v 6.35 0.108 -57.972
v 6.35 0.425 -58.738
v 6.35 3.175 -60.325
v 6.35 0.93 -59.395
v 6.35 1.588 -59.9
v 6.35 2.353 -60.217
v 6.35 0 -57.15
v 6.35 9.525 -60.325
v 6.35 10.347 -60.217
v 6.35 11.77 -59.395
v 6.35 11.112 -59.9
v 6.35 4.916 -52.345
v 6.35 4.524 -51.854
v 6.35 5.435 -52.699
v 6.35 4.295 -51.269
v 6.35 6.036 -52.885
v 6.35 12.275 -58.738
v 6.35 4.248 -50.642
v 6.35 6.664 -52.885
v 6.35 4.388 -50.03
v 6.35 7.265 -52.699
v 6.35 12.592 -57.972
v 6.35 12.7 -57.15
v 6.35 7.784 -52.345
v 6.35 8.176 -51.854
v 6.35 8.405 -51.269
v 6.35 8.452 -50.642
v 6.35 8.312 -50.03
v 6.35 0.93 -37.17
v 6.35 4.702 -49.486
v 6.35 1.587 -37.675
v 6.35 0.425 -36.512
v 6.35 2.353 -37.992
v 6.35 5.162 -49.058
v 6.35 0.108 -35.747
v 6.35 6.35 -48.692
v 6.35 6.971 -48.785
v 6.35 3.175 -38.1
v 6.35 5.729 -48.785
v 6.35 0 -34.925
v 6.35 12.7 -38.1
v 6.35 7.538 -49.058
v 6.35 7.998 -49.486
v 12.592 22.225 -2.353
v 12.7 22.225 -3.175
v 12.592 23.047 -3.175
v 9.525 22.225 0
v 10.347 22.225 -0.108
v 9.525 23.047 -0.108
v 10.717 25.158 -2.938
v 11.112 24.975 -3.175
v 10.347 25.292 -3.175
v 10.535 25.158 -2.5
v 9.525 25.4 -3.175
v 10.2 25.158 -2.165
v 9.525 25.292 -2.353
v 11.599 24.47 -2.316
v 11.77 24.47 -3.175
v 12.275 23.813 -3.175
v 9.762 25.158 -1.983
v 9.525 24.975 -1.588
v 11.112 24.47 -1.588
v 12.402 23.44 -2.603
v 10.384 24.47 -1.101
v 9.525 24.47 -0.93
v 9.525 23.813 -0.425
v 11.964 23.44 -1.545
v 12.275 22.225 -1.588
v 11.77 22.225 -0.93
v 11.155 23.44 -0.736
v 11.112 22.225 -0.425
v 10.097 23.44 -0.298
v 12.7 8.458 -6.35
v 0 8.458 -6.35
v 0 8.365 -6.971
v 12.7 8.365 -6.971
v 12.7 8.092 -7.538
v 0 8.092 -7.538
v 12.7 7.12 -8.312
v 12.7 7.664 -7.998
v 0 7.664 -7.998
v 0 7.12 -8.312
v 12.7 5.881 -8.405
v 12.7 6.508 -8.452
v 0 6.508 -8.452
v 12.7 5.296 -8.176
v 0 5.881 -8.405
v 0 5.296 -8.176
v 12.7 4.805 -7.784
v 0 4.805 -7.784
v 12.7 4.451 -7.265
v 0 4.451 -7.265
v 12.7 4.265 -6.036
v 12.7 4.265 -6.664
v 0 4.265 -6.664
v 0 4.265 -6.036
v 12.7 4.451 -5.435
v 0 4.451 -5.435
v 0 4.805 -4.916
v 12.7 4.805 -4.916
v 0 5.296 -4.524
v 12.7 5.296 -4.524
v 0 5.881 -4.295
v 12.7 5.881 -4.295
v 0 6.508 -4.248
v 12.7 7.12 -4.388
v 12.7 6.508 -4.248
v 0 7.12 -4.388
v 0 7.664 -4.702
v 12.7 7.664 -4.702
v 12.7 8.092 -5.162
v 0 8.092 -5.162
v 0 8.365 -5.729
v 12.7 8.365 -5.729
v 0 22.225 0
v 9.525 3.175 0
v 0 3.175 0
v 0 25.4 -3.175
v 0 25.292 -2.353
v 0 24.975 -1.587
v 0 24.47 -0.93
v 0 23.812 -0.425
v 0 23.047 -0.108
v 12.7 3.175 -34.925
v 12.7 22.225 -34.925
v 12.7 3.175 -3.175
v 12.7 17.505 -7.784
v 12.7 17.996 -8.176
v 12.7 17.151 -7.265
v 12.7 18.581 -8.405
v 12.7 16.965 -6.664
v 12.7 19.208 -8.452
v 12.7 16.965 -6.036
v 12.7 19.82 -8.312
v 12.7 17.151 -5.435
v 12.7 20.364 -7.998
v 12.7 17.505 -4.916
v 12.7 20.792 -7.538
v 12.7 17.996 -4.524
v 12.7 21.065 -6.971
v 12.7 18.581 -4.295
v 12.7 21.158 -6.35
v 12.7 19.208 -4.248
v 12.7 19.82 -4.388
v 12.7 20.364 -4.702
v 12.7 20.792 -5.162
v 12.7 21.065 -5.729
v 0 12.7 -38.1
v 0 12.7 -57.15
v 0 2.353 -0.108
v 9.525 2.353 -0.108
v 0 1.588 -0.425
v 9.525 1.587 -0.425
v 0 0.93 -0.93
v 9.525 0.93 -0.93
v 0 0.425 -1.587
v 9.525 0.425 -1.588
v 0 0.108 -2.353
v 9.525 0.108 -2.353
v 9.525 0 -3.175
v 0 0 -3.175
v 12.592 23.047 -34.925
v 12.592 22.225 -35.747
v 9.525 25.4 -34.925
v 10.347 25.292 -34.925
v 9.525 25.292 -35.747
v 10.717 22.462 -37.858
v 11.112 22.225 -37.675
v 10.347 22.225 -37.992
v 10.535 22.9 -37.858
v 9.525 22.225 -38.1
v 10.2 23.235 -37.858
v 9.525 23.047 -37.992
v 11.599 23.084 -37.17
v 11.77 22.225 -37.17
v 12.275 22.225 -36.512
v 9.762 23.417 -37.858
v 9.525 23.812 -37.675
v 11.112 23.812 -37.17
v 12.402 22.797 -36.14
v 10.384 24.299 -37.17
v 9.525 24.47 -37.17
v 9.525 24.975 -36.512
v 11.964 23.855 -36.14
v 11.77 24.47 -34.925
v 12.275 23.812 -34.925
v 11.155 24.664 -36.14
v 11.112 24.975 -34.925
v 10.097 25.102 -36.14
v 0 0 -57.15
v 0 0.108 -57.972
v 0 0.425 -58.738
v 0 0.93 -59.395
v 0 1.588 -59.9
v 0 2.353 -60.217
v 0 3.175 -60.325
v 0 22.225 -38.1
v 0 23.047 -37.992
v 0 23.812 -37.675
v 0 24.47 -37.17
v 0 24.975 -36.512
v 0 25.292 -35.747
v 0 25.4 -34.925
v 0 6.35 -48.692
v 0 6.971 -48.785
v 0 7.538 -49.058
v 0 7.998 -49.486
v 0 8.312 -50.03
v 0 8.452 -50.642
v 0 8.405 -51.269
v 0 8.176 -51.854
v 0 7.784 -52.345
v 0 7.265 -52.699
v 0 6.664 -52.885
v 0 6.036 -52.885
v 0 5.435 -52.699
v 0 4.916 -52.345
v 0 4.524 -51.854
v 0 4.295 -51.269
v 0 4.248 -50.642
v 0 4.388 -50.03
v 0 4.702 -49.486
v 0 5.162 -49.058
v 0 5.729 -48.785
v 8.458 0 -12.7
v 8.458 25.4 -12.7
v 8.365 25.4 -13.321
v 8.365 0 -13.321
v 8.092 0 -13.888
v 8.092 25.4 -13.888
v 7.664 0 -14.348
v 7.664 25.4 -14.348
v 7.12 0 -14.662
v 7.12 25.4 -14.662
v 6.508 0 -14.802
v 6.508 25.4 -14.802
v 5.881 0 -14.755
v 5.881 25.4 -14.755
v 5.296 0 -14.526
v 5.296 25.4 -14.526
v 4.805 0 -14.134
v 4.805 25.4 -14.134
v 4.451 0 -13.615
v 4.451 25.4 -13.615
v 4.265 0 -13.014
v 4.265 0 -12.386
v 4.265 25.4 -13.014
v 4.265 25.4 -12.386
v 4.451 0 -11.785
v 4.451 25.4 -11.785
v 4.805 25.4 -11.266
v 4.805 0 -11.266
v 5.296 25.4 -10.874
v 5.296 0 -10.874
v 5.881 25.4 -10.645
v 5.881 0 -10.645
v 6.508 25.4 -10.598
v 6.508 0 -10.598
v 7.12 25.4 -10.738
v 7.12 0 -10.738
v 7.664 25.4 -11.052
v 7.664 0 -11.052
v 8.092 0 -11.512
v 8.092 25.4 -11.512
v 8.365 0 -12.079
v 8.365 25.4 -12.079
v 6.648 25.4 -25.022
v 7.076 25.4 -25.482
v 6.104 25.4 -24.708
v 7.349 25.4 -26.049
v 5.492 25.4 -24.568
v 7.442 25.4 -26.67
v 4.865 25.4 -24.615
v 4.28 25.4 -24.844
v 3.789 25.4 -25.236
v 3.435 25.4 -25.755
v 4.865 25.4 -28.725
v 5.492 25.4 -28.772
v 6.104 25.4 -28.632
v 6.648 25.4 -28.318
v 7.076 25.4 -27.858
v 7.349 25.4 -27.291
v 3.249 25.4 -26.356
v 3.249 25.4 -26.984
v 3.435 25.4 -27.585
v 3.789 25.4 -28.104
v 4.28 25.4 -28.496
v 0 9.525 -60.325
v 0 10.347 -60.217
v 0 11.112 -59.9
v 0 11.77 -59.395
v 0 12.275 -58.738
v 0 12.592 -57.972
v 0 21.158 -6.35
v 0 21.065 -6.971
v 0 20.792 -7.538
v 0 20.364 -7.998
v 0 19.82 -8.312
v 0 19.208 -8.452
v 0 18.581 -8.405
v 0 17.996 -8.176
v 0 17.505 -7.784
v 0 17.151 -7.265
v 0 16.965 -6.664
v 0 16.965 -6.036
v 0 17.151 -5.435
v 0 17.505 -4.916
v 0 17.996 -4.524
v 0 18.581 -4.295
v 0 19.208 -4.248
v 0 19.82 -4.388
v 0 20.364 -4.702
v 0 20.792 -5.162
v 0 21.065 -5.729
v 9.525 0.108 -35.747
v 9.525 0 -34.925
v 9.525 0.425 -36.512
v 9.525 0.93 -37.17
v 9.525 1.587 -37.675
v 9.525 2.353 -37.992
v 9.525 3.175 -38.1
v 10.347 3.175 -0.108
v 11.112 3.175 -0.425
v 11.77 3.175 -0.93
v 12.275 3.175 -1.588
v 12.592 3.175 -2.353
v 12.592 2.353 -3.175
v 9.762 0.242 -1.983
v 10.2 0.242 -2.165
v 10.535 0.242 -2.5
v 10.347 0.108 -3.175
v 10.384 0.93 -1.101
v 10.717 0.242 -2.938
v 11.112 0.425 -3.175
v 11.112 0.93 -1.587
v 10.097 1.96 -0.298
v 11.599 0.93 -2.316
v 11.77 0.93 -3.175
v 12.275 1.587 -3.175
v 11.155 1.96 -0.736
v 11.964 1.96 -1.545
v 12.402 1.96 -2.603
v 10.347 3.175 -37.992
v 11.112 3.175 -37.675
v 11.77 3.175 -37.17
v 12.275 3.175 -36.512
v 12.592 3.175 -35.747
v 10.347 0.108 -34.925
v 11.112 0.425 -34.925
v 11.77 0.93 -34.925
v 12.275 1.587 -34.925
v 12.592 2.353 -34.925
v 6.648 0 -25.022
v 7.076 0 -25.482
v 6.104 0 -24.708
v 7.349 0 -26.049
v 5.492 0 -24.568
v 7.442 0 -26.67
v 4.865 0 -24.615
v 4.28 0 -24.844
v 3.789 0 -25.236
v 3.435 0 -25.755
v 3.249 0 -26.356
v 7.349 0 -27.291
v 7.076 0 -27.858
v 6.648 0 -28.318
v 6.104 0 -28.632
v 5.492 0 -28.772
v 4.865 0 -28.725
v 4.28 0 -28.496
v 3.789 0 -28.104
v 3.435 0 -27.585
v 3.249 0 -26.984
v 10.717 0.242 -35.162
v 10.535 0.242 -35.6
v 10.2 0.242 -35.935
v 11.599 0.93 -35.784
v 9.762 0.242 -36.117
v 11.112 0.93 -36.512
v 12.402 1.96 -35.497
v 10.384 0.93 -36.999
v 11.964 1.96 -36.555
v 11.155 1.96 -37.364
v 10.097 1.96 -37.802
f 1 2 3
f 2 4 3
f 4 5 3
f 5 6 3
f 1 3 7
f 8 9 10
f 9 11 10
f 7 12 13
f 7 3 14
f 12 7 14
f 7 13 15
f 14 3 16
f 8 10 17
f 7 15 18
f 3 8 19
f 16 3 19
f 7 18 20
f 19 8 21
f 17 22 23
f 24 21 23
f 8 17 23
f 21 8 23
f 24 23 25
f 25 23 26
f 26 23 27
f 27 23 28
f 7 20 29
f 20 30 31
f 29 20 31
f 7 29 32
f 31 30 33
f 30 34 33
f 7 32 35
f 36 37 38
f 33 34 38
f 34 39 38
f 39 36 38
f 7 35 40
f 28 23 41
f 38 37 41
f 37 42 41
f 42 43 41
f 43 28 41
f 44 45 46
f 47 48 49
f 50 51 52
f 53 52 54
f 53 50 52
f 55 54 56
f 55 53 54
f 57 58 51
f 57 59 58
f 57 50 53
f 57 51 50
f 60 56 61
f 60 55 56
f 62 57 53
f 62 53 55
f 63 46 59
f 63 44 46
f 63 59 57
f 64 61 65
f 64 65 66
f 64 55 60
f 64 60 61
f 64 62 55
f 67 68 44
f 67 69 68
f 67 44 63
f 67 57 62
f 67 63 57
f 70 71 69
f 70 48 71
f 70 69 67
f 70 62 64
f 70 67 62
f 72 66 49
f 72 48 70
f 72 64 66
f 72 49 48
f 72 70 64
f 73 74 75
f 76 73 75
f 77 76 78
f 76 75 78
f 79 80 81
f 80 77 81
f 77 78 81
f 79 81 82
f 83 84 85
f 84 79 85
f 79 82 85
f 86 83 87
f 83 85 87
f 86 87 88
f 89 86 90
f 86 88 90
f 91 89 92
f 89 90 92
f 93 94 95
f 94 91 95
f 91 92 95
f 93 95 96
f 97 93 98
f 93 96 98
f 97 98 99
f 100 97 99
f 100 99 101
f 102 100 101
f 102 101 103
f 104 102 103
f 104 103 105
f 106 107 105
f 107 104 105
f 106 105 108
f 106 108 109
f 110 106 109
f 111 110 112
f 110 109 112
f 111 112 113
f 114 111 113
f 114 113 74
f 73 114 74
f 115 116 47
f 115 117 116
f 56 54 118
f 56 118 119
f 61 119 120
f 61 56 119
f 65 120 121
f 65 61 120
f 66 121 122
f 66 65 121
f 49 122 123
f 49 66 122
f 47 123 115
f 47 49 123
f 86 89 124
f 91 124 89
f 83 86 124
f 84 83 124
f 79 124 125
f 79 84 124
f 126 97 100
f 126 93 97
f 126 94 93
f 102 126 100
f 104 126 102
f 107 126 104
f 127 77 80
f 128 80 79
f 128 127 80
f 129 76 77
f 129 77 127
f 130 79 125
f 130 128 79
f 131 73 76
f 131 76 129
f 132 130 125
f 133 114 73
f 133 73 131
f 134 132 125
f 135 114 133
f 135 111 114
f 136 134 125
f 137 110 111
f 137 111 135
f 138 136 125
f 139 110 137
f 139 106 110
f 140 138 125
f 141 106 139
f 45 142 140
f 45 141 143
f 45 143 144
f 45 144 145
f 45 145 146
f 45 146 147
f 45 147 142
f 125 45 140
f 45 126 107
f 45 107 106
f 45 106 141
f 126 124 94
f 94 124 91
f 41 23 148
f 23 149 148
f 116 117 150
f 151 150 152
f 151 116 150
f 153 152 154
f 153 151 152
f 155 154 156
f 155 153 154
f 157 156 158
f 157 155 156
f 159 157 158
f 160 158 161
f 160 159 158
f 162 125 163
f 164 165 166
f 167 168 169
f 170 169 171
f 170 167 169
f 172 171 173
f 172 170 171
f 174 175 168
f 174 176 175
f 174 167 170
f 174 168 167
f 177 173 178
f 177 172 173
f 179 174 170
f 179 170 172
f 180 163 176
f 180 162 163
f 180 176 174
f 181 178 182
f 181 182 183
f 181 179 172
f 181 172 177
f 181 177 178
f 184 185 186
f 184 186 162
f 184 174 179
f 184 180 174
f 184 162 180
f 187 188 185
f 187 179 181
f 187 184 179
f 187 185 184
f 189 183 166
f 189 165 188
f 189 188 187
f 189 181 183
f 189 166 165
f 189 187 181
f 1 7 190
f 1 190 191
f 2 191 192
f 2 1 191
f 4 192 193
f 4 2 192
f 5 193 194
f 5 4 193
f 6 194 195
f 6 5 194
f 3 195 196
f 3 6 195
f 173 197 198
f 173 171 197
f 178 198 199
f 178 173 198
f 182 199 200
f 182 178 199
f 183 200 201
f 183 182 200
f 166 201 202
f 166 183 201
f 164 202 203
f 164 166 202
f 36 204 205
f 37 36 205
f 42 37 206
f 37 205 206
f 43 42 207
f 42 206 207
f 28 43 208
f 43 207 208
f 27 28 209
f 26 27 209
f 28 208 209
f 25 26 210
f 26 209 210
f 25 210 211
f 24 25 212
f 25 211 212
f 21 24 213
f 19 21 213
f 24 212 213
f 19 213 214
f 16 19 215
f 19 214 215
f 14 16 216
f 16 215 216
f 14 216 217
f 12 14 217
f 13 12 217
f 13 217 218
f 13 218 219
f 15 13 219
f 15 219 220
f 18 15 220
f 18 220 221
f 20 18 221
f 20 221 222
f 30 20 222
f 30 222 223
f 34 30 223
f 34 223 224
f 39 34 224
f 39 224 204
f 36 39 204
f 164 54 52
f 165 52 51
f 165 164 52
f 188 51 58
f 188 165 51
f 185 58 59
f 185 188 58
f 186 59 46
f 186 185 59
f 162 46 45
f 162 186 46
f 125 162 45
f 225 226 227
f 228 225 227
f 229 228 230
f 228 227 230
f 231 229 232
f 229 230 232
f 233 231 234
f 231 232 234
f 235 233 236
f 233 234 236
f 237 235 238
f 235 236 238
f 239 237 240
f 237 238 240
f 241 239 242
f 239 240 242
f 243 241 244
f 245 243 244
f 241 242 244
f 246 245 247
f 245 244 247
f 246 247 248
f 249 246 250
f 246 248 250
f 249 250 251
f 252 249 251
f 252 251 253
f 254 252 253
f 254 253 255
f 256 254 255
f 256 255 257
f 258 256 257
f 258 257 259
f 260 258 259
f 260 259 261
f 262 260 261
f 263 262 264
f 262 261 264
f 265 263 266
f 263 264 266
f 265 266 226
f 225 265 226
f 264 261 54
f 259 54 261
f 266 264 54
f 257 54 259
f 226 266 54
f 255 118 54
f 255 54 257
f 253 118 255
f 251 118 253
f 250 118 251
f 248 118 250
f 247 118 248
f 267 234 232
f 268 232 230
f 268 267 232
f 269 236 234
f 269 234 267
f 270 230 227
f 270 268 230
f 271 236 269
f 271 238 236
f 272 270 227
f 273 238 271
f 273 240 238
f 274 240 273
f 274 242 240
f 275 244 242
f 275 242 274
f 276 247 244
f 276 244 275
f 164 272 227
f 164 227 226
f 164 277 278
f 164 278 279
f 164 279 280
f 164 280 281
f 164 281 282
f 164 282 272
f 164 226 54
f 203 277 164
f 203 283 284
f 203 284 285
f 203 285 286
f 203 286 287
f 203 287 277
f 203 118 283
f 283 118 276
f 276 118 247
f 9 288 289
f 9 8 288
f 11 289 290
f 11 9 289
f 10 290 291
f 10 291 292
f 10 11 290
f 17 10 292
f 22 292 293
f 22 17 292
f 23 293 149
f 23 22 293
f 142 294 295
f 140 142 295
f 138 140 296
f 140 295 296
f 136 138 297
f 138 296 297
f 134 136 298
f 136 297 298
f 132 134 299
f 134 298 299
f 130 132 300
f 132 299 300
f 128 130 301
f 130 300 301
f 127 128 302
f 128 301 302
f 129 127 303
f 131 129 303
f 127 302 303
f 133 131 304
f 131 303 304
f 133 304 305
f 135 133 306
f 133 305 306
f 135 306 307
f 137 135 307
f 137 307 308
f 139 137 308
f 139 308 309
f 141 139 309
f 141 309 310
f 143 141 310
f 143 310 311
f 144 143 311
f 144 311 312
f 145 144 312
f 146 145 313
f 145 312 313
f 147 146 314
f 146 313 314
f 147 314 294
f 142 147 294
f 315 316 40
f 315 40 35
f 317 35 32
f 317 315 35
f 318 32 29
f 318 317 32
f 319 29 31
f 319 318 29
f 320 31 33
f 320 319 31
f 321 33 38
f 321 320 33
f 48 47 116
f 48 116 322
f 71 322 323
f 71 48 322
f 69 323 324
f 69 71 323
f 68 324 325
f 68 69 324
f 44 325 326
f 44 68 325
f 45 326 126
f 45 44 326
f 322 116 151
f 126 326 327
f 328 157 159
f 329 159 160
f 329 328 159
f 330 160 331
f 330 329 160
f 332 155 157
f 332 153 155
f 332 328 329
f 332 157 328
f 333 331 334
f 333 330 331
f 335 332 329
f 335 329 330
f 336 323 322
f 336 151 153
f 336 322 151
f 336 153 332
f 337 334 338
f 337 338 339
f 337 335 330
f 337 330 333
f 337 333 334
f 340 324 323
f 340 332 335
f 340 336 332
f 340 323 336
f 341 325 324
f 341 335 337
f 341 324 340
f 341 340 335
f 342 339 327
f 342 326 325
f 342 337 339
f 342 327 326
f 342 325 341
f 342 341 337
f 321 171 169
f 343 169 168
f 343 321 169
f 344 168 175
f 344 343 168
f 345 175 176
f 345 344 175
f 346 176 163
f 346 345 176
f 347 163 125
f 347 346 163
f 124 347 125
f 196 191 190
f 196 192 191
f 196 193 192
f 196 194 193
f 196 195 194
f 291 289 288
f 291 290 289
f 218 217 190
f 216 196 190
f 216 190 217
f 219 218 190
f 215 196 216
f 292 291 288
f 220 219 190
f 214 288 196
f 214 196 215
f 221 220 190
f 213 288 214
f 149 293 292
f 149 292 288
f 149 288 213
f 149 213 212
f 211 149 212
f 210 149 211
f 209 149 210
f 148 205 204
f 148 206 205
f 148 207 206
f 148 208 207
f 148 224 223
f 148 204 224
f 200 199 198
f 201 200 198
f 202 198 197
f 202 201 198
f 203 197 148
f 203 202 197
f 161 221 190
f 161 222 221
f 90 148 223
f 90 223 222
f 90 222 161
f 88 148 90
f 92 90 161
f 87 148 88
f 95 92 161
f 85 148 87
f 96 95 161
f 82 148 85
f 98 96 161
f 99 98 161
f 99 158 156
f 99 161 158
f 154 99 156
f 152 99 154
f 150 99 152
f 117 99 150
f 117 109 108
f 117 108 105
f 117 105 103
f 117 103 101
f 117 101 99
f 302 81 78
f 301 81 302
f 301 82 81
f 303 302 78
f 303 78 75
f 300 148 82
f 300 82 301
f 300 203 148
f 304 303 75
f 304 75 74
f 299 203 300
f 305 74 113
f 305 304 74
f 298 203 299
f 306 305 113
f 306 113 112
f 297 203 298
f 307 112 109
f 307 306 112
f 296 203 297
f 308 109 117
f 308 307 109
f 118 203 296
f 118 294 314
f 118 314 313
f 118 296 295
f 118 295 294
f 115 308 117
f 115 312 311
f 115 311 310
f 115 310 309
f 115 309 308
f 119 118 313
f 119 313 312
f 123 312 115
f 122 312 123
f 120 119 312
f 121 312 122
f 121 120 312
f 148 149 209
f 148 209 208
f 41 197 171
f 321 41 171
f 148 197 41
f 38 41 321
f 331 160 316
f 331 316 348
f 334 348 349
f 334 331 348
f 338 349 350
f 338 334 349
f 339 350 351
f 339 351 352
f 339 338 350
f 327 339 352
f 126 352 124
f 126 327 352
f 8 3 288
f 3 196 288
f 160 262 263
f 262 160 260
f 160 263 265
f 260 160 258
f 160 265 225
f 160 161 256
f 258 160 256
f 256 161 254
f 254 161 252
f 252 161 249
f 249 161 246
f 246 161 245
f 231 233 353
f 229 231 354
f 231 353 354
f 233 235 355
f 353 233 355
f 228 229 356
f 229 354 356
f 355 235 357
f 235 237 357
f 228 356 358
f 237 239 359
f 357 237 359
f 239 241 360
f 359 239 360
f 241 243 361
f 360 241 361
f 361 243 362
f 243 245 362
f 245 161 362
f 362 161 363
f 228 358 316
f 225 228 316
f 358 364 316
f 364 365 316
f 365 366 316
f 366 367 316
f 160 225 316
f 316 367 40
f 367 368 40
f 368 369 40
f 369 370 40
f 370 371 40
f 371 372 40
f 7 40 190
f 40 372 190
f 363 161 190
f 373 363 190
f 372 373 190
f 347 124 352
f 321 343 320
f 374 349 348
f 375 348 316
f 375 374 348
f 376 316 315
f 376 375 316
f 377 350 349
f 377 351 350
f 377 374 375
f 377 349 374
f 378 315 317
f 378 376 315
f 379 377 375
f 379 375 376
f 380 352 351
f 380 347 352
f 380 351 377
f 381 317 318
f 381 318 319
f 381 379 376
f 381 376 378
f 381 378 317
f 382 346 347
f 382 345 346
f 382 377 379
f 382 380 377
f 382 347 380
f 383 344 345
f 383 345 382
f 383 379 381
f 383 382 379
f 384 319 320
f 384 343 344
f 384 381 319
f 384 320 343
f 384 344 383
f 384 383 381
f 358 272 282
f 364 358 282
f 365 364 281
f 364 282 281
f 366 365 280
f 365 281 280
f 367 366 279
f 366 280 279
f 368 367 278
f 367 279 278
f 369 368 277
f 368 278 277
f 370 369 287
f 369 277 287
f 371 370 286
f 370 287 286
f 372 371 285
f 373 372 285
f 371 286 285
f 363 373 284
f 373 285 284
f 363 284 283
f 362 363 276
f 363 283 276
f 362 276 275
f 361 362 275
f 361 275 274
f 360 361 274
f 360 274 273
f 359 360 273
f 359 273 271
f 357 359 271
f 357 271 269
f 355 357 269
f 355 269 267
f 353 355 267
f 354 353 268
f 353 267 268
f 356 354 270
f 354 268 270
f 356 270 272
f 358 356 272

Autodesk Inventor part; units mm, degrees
ref_plane "YZ Plane" through (0, 0, 0) normal (1, 0, 0) x (0, 1, 0)
ref_plane "XZ Plane" through (0, 0, 0) normal (0, 1, 0) x (-1, 0, 0)
ref_plane "XY Plane" through (0, 0, 0) normal (0, 0, 1) x (1, 0, 0)
sketch "Sketch1" plane through (0, 0, 0) normal (1, 0, 0) x (0, 1, 0)
  line L0 (0, 0) -> (25.4, 0)
  line L1 (25.4, 0) -> (25.4, -38.1)
  line L2 (25.4, -38.1) -> (0, -38.1)
  line L3 (0, -38.1) -> (0, 0)
  line L4 (25.4, 0) -> (25.4, -6.35)
  line L5 (25.4, -6.35) -> (19.05, -6.35)
  line L6 (19.05, -6.35) -> (6.35, -6.35)
  circle A0 centre (19.05, -6.35) radius 2.1082
  circle A1 centre (6.35, -6.35) radius 2.1082
  dimension "d0" = 38.1
  dimension "d1" = 25.4
  dimension "d2" = 6.35
  dimension "d3" = 6.35
  dimension "d4" = 12.7
  dimension "d5" = 4.2164
extrude "Extrusion1" add sketch "Sketch1" along normal blind 12.7
sketch "Sketch2" plane through (0, 25.4, 0) normal (0, 1, 0) x (1, 0, 0)
  line L0 (0, 0) -> (0, 38.1) projected
  line L1 (0, 38.1) -> (12.7, 38.1) projected
  line L2 (0, 38.1) -> (12.7, 38.1)
  circle A0 centre (6.35, 12.7) radius 2.1082
  line L3 (0, 0) -> (12.7, 0) projected
  line L4 (6.35, 0) -> (6.35, 12.7)
  dimension "d9" = 4.2164
extrude "Extrusion2" cut sketch "Sketch2" against normal blind 39.6875
fillet "Fillet1" radius 3.175 8 edges at (12.7, 12.7, 0) (12.7, 25.4, -19.05) (6.35, 25.4, -38.1) (12.7, 12.7, -38.1) (12.7, 0, -19.05) (6.35, 25.4, 0) (6.35, 0, 0) (6.35, 0, -38.1)
sketch "Sketch5" plane through (0, 25.4, -3.175) normal (0, 1, 0) x (1, 0, 0)
  circle A0 centre (6.35, 9.525) radius 2.1082 projected
  line L0 (6.35, 9.525) -> (6.35, 23.495)
  line L1 (6.35, 23.495) -> (5.334, 23.495)
  circle A1 centre (5.334, 23.495) radius 2.1082
  point P0 (0, -3.175)
  dimension "d22" = 13.97
  dimension "d23" = 1.016
  dimension "d24" = 4.2164
extrude "Extrusion5" cut sketch "Sketch5" against normal blind 57.15 contours A1
sketch "Sketch6" plane through (0, 0, 0) normal (-1, 0, 0) x (0, 0, 1)
  circle A0 centre (-6.35, 6.35) radius 2.1082 projected
  line L0 (-6.35, 6.35) -> (-50.8, 6.35)
  circle A1 centre (-50.8, 6.35) radius 2.1082
  line L1 (-3.175, 0) -> (-34.925, 0) projected
  line L2 (-3.175, 25.4) -> (-3.175, 22.225) projected
  line L3 (-3.175, 0) -> (-3.175, 25.4)
  line L4 (-3.175, 0) -> (-60.325, 0)
  line L5 (-60.325, 0) -> (-60.325, 12.7)
  line L6 (-60.325, 12.7) -> (-3.175, 12.7)
  line L7 (-3.175, 12.7) -> (-3.175, 0)
  line L8 (-34.925, 0) -> (-34.925, 12.7)
  line L9 (-34.925, 22.225) -> (-34.925, 3.175) projected
  point P0 (0, 0)
  point P1 (-34.925, 0)
  dimension "d27" = 44.45
  dimension "d28" = 57.15
extrude "Extrusion6" add sketch "Sketch6" against normal blind 6.35 contours L4 L5 L6 L8
fillet "Fillet2" radius 3.175 2 edges at (3.175, 12.7, -60.325) (3.175, 0, -60.325)
properties part number "wing mount 1 v1"
